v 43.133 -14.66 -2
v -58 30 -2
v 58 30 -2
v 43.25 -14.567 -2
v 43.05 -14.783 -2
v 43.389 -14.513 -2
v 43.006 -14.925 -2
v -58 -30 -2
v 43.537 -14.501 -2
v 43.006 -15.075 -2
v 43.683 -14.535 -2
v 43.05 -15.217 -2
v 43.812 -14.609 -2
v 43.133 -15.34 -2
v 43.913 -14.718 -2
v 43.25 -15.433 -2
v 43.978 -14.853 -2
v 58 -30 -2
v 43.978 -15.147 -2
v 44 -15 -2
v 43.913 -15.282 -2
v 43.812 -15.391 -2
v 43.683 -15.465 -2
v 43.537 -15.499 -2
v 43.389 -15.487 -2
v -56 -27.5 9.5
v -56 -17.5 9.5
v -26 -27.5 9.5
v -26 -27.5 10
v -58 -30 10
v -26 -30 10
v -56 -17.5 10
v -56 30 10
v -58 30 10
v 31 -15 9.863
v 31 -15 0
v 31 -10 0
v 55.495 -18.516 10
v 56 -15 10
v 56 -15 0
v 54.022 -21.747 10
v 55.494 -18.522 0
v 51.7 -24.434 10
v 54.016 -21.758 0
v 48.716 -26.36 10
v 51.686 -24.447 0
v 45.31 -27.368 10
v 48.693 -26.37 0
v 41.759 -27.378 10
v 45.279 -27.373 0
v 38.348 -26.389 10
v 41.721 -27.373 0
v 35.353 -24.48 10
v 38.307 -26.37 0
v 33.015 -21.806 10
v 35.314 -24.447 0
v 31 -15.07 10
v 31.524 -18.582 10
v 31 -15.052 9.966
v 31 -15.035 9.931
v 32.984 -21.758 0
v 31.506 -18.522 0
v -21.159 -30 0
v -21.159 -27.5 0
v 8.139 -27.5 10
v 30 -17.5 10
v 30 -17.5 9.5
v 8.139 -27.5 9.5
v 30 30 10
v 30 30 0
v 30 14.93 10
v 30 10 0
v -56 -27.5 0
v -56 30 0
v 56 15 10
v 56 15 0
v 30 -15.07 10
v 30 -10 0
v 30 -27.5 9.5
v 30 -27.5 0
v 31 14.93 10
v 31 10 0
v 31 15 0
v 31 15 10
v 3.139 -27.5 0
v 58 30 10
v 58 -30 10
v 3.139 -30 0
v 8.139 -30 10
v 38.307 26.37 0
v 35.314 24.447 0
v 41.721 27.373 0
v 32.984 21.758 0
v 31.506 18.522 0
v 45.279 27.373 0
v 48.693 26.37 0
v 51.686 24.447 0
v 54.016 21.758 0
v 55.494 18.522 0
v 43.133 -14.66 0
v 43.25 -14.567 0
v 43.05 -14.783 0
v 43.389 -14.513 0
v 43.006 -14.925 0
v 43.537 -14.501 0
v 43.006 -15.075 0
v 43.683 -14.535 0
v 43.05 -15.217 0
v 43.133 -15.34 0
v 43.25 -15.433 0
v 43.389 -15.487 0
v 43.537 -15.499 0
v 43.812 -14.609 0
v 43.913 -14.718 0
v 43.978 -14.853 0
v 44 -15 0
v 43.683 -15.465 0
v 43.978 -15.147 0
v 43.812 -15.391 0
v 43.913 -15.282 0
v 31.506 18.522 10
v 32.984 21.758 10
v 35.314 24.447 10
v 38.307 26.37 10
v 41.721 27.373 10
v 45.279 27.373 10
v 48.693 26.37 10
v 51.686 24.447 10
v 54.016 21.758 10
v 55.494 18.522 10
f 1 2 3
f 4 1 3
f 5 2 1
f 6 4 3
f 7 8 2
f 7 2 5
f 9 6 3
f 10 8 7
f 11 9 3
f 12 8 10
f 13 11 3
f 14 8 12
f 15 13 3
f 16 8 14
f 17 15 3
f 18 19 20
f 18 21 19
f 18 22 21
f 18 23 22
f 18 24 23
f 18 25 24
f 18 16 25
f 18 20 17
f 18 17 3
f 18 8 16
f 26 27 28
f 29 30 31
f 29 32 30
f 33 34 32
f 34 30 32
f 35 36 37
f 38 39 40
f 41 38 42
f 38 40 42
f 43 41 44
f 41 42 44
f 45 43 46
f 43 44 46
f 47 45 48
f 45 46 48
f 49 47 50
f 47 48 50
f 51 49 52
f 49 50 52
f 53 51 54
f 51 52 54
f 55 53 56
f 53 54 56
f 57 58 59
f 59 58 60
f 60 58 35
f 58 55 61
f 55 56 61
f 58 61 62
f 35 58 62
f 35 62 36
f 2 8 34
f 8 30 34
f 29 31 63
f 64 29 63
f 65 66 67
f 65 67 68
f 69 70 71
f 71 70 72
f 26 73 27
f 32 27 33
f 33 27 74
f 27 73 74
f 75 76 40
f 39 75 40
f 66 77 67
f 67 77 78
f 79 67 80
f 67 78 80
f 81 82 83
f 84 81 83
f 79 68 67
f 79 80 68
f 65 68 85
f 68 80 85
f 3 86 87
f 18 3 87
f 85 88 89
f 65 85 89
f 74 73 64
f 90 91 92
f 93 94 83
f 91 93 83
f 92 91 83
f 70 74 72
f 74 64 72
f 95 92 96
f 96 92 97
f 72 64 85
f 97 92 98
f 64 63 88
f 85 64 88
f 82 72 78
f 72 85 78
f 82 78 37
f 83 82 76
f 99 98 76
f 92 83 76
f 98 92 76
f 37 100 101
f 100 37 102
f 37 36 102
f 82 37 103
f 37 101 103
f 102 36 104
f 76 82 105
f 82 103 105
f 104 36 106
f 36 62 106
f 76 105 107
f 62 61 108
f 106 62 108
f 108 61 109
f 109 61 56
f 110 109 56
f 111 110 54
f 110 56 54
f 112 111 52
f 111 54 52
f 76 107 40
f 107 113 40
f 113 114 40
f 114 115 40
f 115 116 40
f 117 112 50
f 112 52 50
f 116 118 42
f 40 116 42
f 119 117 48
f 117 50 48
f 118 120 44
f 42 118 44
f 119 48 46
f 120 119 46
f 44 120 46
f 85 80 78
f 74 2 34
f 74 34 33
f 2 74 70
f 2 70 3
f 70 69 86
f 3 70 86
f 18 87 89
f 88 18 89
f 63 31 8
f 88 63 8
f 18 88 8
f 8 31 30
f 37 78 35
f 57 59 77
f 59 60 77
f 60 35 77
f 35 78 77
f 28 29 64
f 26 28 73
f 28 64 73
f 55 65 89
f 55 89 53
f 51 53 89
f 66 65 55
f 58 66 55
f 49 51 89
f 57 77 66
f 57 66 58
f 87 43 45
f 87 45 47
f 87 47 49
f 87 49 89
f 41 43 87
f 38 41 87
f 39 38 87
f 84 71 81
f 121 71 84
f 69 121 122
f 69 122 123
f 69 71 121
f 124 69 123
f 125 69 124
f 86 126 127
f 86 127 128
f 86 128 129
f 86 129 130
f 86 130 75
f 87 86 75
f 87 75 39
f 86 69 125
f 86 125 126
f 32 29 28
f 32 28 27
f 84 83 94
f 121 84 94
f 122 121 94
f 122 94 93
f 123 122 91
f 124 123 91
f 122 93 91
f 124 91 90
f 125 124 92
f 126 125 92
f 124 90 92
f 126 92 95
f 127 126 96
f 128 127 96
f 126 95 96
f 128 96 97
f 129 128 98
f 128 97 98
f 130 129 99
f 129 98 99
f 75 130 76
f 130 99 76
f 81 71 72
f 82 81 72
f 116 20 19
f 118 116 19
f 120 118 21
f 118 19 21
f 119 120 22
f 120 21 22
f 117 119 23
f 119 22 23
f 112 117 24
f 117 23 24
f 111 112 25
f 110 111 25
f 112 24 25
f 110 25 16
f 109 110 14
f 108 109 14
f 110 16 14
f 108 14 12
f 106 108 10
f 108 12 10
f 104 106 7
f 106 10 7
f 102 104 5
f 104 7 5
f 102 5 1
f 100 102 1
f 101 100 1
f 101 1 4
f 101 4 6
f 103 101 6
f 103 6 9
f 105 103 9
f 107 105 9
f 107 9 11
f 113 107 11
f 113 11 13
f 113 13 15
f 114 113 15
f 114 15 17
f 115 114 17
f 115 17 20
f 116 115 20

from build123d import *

# Parameters (mm, degrees)
F1_DEPTH  = 10
F2_W      = 86
F2_H      = 57.5
F3_DEPTH  = 2
F5_DEPTH  = 60.001
F7_DEPTH  = 0.5
F9_DEPTH  = 0.5
F10_R     = 0.5
F11_DEPTH = 12.001
F13_DEPTH = 3


with BuildPart() as f1:
    # F0 (on Top) → F1 (new body)
    with BuildSketch(Plane.XY):
        Polygon((-58, -30), (58, -30), (58, 30), (30, 30), (30, -27.5), (-56, -27.5), (-56, 30), (-58, 30), align=None)
        with BuildLine():
            ThreePointArc((31, 15), (43.5, 27.5), (56, 15))
            Line((56, 15), (56, -15))
            ThreePointArc((56, -15), (43.5, -27.5), (31, -15))
            Line((31, -15), (31, 15))
        make_face(mode=Mode.SUBTRACT)
    extrude(amount=F1_DEPTH)

    # F2 (on face) → F3 (join)
    with BuildSketch(Plane(origin=(0, 0, 0), x_dir=(1, 0, 0), z_dir=(0, 0, -1))):
        with Locations((-13, -1.25)):
            Rectangle(F2_W, F2_H)
        Polygon((30, -30), (58, -30), (58, 30), (-58, 30), (-58, -30), (-56, -30), (-56, 27.5), (30, 27.5), align=None)
        with BuildLine():
            Line((56, 15), (56, -15))
            ThreePointArc((56, -15), (43.5, -27.5), (31, -15))
            Line((31, -15), (31, 15))
            ThreePointArc((31, 15), (43.5, 27.5), (56, 15))
        make_face(mode=Mode.SUBTRACT)
        with BuildLine():
            ThreePointArc((31, -15), (43.5, -27.5), (56, -15))
            Line((56, -15), (56, 15))
            ThreePointArc((56, 15), (43.5, 27.5), (31, 15))
            Line((31, 15), (31, -15))
        make_face()
    extrude(amount=F3_DEPTH)

    # F4 (on face) → F5 (cut, through all)
    with BuildSketch(Plane.XZ.offset(30)):
        Polygon((8.1389684882, 10), (-26, 10), (-21.1587326229, 0), (3.1389684882, 0), align=None)
    extrude(amount=-F5_DEPTH, mode=Mode.SUBTRACT)

    # F6 (on face) → F7 (join)
    with BuildSketch(Plane.XY.offset(10)):
        Polygon((-56, -27.5), (-26, -27.5), (-56, -17.5), align=None)
    extrude(amount=-F7_DEPTH)

    # F8 (on face) → F9 (join)
    with BuildSketch(Plane.XY.offset(10)):
        Polygon((30, -17.5), (8.1389684882, -27.5), (30, -27.5), align=None)
    extrude(amount=-F9_DEPTH)

    # F10 (on face) → F11 (cut, through all)
    with BuildSketch(Plane(origin=(0, 0, -2), x_dir=(1, 0, 0), z_dir=(0, 0, -1))):
        with Locations((43.5, 15)):
            Circle(F10_R)
    extrude(amount=-F11_DEPTH, mode=Mode.SUBTRACT)

    # F12 (on face) → F13 (cut)
    with BuildSketch(Plane(origin=(30, 0, 0), x_dir=(0, -1, 0), z_dir=(-1, 0, 0))):
        Polygon((15.0695058703, 10), (-14.9304941297, 10), (-10, 0), (10, 0), align=None)
    extrude(amount=-F13_DEPTH, mode=Mode.SUBTRACT)


solid = f1.part
